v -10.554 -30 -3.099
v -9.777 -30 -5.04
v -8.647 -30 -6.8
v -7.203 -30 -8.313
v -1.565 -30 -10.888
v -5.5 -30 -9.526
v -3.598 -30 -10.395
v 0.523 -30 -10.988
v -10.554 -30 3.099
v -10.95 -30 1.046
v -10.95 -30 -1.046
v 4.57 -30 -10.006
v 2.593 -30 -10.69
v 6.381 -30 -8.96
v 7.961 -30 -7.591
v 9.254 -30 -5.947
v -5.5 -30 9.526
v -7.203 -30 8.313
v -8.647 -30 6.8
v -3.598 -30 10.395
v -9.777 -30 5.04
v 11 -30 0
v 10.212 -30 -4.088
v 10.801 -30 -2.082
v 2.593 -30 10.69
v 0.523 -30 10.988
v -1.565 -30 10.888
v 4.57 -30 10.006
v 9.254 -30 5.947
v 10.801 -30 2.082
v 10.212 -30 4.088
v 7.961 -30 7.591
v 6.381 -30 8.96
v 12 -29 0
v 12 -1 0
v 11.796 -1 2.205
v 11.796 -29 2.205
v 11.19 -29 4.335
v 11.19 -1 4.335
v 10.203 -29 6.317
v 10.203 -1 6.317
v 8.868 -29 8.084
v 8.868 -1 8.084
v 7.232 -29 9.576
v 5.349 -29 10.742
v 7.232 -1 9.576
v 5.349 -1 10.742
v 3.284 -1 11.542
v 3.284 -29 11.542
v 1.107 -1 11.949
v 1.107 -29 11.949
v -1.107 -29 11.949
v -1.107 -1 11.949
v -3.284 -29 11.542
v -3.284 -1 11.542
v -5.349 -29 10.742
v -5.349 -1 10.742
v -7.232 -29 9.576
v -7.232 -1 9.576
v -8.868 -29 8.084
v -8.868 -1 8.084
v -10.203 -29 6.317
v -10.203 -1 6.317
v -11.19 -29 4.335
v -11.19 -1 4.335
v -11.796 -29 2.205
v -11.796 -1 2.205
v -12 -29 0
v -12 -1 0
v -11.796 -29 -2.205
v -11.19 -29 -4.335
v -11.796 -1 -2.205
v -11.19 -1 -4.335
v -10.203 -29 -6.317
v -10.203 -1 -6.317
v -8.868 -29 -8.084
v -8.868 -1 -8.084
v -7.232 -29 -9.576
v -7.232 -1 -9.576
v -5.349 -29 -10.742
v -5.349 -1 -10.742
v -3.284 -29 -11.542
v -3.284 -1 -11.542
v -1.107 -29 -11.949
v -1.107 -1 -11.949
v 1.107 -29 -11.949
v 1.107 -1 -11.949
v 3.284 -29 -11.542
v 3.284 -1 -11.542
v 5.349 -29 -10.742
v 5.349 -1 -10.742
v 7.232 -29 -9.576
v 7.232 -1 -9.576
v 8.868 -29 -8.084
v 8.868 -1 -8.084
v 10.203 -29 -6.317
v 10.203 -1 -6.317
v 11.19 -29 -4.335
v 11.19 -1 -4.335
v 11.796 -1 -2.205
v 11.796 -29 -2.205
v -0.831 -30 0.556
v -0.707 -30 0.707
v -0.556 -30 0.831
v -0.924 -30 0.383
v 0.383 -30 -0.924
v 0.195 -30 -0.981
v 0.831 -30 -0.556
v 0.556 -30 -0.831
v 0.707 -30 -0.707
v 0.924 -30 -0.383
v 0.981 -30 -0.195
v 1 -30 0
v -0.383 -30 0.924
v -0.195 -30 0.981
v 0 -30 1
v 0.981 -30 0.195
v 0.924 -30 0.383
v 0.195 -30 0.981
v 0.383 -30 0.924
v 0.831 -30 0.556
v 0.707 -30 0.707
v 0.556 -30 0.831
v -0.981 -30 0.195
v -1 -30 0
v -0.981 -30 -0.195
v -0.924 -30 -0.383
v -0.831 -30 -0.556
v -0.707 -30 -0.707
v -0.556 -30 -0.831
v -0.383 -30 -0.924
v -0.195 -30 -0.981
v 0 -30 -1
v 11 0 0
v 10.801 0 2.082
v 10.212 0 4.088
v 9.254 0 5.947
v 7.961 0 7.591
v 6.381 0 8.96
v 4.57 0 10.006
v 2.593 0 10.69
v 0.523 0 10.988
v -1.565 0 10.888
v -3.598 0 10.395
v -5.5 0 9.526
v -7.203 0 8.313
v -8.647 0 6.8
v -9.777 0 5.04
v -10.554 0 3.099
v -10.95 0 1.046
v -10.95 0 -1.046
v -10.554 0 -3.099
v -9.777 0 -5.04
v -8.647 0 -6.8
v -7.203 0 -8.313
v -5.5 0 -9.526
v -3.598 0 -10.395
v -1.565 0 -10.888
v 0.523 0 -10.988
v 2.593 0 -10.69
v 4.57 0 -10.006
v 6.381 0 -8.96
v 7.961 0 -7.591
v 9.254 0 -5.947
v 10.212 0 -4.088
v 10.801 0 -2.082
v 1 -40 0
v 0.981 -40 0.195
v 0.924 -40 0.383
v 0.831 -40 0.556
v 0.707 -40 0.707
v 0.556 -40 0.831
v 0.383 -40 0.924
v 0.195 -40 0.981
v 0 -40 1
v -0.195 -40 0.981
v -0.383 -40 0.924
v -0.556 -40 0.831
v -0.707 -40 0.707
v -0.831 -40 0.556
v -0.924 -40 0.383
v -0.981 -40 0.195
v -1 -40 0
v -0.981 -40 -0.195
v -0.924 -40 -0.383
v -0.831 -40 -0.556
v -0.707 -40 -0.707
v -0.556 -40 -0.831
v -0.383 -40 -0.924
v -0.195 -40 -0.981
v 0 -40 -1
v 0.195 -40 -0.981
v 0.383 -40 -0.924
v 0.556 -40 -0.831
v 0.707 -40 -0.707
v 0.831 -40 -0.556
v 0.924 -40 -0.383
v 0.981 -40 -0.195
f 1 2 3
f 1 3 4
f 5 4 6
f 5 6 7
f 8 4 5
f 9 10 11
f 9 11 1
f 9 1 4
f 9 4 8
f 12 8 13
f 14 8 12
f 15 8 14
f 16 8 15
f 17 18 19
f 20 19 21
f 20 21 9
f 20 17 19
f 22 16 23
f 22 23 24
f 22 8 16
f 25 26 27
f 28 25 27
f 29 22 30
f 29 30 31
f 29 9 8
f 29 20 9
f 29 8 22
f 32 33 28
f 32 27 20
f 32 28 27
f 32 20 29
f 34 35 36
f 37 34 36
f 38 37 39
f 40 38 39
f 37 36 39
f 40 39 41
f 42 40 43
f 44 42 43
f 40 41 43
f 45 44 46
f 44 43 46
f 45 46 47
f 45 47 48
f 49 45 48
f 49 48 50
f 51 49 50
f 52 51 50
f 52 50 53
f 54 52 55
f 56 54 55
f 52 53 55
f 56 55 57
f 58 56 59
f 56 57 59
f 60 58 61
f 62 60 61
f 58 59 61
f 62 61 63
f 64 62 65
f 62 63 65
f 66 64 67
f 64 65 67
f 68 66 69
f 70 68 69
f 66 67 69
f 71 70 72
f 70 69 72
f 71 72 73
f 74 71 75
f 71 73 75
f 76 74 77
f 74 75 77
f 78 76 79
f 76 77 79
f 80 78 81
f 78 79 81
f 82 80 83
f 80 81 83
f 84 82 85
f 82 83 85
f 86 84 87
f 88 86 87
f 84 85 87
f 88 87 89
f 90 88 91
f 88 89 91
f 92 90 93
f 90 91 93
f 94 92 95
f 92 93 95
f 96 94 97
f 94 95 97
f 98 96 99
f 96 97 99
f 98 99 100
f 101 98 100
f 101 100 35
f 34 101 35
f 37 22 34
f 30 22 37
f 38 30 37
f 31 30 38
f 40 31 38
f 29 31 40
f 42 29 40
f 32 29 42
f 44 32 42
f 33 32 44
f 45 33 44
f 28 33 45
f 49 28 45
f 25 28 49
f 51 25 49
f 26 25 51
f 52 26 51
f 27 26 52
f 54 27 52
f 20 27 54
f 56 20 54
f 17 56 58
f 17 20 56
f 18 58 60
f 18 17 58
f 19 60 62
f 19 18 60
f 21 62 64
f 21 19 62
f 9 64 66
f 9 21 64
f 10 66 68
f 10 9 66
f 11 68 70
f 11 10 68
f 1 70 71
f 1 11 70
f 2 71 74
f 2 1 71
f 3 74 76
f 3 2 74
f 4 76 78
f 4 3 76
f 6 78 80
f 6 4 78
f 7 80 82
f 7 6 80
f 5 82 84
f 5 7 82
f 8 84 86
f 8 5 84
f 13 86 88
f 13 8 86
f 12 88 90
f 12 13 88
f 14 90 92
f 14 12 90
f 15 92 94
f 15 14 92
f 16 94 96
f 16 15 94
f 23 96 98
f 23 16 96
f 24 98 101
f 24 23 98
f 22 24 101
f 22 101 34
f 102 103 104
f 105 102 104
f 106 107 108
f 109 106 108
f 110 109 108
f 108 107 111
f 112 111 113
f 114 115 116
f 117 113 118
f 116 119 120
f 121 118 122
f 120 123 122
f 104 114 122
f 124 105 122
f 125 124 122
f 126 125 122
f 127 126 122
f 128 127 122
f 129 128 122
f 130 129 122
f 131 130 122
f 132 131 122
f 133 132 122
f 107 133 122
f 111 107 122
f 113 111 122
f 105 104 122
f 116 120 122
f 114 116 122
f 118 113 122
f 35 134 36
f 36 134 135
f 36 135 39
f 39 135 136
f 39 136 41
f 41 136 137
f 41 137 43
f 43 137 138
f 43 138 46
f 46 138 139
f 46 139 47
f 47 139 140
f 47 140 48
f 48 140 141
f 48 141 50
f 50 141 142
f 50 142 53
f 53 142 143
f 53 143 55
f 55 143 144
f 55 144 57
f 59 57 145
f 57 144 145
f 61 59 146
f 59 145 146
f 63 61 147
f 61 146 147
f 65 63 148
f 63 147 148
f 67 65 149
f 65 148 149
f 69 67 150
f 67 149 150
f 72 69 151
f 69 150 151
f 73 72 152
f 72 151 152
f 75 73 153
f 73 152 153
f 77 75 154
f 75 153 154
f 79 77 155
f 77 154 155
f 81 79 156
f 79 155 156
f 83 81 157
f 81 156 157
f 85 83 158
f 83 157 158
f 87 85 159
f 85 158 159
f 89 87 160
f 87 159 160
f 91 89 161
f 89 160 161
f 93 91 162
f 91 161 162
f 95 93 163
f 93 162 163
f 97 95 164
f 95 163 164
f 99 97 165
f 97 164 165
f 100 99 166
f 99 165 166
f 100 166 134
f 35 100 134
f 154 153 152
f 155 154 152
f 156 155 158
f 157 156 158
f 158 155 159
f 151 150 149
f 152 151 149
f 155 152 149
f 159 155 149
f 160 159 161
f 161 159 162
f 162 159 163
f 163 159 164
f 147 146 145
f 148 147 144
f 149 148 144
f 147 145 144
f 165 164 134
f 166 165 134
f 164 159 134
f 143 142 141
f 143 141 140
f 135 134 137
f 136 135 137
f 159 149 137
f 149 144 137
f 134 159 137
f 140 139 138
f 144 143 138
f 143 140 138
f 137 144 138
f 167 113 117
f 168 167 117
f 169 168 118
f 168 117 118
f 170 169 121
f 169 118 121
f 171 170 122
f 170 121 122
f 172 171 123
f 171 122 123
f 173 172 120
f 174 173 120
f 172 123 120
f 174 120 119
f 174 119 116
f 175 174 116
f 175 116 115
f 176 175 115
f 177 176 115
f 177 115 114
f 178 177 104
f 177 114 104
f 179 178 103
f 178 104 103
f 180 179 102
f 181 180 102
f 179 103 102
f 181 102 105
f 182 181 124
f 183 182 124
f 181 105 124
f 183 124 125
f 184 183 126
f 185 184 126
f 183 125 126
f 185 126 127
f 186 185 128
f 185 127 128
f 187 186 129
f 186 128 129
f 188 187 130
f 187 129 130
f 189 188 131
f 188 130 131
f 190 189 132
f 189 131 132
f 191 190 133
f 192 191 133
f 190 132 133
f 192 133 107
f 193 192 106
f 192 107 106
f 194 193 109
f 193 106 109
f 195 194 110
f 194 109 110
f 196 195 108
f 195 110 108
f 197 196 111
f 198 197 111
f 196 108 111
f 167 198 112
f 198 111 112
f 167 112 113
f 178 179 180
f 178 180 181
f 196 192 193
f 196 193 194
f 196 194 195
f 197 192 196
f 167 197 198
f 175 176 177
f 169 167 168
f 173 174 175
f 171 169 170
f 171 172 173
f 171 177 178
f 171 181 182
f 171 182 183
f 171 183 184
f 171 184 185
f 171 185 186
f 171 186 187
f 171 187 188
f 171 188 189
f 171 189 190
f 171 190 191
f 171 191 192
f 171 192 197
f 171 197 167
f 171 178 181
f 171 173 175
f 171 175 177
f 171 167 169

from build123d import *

# Parameters (mm, degrees)
F0_R     = 12
F1_DEPTH = 30
F2_SIZE  = 1
F3_R     = 1
F4_DEPTH = 10


with BuildPart() as f1:
    # F0 (on Front) → F1 (new body)
    with BuildSketch(Plane.XZ):
        Circle(F0_R)
    extrude(amount=F1_DEPTH)

    # F2
    f2_edges = [f1.edges().sort_by_distance(p)[0] for p in [
        (-12, -30, 0),
        (-12, 0, 0),
    ]]
    chamfer(f2_edges, length=F2_SIZE)


with BuildPart() as f4:
    # F3 (on face) → F4 (new body)
    with BuildSketch(Plane.XZ.offset(30)):
        Circle(F3_R)
    extrude(amount=F4_DEPTH)


solid = Compound([f1.part, f4.part])
